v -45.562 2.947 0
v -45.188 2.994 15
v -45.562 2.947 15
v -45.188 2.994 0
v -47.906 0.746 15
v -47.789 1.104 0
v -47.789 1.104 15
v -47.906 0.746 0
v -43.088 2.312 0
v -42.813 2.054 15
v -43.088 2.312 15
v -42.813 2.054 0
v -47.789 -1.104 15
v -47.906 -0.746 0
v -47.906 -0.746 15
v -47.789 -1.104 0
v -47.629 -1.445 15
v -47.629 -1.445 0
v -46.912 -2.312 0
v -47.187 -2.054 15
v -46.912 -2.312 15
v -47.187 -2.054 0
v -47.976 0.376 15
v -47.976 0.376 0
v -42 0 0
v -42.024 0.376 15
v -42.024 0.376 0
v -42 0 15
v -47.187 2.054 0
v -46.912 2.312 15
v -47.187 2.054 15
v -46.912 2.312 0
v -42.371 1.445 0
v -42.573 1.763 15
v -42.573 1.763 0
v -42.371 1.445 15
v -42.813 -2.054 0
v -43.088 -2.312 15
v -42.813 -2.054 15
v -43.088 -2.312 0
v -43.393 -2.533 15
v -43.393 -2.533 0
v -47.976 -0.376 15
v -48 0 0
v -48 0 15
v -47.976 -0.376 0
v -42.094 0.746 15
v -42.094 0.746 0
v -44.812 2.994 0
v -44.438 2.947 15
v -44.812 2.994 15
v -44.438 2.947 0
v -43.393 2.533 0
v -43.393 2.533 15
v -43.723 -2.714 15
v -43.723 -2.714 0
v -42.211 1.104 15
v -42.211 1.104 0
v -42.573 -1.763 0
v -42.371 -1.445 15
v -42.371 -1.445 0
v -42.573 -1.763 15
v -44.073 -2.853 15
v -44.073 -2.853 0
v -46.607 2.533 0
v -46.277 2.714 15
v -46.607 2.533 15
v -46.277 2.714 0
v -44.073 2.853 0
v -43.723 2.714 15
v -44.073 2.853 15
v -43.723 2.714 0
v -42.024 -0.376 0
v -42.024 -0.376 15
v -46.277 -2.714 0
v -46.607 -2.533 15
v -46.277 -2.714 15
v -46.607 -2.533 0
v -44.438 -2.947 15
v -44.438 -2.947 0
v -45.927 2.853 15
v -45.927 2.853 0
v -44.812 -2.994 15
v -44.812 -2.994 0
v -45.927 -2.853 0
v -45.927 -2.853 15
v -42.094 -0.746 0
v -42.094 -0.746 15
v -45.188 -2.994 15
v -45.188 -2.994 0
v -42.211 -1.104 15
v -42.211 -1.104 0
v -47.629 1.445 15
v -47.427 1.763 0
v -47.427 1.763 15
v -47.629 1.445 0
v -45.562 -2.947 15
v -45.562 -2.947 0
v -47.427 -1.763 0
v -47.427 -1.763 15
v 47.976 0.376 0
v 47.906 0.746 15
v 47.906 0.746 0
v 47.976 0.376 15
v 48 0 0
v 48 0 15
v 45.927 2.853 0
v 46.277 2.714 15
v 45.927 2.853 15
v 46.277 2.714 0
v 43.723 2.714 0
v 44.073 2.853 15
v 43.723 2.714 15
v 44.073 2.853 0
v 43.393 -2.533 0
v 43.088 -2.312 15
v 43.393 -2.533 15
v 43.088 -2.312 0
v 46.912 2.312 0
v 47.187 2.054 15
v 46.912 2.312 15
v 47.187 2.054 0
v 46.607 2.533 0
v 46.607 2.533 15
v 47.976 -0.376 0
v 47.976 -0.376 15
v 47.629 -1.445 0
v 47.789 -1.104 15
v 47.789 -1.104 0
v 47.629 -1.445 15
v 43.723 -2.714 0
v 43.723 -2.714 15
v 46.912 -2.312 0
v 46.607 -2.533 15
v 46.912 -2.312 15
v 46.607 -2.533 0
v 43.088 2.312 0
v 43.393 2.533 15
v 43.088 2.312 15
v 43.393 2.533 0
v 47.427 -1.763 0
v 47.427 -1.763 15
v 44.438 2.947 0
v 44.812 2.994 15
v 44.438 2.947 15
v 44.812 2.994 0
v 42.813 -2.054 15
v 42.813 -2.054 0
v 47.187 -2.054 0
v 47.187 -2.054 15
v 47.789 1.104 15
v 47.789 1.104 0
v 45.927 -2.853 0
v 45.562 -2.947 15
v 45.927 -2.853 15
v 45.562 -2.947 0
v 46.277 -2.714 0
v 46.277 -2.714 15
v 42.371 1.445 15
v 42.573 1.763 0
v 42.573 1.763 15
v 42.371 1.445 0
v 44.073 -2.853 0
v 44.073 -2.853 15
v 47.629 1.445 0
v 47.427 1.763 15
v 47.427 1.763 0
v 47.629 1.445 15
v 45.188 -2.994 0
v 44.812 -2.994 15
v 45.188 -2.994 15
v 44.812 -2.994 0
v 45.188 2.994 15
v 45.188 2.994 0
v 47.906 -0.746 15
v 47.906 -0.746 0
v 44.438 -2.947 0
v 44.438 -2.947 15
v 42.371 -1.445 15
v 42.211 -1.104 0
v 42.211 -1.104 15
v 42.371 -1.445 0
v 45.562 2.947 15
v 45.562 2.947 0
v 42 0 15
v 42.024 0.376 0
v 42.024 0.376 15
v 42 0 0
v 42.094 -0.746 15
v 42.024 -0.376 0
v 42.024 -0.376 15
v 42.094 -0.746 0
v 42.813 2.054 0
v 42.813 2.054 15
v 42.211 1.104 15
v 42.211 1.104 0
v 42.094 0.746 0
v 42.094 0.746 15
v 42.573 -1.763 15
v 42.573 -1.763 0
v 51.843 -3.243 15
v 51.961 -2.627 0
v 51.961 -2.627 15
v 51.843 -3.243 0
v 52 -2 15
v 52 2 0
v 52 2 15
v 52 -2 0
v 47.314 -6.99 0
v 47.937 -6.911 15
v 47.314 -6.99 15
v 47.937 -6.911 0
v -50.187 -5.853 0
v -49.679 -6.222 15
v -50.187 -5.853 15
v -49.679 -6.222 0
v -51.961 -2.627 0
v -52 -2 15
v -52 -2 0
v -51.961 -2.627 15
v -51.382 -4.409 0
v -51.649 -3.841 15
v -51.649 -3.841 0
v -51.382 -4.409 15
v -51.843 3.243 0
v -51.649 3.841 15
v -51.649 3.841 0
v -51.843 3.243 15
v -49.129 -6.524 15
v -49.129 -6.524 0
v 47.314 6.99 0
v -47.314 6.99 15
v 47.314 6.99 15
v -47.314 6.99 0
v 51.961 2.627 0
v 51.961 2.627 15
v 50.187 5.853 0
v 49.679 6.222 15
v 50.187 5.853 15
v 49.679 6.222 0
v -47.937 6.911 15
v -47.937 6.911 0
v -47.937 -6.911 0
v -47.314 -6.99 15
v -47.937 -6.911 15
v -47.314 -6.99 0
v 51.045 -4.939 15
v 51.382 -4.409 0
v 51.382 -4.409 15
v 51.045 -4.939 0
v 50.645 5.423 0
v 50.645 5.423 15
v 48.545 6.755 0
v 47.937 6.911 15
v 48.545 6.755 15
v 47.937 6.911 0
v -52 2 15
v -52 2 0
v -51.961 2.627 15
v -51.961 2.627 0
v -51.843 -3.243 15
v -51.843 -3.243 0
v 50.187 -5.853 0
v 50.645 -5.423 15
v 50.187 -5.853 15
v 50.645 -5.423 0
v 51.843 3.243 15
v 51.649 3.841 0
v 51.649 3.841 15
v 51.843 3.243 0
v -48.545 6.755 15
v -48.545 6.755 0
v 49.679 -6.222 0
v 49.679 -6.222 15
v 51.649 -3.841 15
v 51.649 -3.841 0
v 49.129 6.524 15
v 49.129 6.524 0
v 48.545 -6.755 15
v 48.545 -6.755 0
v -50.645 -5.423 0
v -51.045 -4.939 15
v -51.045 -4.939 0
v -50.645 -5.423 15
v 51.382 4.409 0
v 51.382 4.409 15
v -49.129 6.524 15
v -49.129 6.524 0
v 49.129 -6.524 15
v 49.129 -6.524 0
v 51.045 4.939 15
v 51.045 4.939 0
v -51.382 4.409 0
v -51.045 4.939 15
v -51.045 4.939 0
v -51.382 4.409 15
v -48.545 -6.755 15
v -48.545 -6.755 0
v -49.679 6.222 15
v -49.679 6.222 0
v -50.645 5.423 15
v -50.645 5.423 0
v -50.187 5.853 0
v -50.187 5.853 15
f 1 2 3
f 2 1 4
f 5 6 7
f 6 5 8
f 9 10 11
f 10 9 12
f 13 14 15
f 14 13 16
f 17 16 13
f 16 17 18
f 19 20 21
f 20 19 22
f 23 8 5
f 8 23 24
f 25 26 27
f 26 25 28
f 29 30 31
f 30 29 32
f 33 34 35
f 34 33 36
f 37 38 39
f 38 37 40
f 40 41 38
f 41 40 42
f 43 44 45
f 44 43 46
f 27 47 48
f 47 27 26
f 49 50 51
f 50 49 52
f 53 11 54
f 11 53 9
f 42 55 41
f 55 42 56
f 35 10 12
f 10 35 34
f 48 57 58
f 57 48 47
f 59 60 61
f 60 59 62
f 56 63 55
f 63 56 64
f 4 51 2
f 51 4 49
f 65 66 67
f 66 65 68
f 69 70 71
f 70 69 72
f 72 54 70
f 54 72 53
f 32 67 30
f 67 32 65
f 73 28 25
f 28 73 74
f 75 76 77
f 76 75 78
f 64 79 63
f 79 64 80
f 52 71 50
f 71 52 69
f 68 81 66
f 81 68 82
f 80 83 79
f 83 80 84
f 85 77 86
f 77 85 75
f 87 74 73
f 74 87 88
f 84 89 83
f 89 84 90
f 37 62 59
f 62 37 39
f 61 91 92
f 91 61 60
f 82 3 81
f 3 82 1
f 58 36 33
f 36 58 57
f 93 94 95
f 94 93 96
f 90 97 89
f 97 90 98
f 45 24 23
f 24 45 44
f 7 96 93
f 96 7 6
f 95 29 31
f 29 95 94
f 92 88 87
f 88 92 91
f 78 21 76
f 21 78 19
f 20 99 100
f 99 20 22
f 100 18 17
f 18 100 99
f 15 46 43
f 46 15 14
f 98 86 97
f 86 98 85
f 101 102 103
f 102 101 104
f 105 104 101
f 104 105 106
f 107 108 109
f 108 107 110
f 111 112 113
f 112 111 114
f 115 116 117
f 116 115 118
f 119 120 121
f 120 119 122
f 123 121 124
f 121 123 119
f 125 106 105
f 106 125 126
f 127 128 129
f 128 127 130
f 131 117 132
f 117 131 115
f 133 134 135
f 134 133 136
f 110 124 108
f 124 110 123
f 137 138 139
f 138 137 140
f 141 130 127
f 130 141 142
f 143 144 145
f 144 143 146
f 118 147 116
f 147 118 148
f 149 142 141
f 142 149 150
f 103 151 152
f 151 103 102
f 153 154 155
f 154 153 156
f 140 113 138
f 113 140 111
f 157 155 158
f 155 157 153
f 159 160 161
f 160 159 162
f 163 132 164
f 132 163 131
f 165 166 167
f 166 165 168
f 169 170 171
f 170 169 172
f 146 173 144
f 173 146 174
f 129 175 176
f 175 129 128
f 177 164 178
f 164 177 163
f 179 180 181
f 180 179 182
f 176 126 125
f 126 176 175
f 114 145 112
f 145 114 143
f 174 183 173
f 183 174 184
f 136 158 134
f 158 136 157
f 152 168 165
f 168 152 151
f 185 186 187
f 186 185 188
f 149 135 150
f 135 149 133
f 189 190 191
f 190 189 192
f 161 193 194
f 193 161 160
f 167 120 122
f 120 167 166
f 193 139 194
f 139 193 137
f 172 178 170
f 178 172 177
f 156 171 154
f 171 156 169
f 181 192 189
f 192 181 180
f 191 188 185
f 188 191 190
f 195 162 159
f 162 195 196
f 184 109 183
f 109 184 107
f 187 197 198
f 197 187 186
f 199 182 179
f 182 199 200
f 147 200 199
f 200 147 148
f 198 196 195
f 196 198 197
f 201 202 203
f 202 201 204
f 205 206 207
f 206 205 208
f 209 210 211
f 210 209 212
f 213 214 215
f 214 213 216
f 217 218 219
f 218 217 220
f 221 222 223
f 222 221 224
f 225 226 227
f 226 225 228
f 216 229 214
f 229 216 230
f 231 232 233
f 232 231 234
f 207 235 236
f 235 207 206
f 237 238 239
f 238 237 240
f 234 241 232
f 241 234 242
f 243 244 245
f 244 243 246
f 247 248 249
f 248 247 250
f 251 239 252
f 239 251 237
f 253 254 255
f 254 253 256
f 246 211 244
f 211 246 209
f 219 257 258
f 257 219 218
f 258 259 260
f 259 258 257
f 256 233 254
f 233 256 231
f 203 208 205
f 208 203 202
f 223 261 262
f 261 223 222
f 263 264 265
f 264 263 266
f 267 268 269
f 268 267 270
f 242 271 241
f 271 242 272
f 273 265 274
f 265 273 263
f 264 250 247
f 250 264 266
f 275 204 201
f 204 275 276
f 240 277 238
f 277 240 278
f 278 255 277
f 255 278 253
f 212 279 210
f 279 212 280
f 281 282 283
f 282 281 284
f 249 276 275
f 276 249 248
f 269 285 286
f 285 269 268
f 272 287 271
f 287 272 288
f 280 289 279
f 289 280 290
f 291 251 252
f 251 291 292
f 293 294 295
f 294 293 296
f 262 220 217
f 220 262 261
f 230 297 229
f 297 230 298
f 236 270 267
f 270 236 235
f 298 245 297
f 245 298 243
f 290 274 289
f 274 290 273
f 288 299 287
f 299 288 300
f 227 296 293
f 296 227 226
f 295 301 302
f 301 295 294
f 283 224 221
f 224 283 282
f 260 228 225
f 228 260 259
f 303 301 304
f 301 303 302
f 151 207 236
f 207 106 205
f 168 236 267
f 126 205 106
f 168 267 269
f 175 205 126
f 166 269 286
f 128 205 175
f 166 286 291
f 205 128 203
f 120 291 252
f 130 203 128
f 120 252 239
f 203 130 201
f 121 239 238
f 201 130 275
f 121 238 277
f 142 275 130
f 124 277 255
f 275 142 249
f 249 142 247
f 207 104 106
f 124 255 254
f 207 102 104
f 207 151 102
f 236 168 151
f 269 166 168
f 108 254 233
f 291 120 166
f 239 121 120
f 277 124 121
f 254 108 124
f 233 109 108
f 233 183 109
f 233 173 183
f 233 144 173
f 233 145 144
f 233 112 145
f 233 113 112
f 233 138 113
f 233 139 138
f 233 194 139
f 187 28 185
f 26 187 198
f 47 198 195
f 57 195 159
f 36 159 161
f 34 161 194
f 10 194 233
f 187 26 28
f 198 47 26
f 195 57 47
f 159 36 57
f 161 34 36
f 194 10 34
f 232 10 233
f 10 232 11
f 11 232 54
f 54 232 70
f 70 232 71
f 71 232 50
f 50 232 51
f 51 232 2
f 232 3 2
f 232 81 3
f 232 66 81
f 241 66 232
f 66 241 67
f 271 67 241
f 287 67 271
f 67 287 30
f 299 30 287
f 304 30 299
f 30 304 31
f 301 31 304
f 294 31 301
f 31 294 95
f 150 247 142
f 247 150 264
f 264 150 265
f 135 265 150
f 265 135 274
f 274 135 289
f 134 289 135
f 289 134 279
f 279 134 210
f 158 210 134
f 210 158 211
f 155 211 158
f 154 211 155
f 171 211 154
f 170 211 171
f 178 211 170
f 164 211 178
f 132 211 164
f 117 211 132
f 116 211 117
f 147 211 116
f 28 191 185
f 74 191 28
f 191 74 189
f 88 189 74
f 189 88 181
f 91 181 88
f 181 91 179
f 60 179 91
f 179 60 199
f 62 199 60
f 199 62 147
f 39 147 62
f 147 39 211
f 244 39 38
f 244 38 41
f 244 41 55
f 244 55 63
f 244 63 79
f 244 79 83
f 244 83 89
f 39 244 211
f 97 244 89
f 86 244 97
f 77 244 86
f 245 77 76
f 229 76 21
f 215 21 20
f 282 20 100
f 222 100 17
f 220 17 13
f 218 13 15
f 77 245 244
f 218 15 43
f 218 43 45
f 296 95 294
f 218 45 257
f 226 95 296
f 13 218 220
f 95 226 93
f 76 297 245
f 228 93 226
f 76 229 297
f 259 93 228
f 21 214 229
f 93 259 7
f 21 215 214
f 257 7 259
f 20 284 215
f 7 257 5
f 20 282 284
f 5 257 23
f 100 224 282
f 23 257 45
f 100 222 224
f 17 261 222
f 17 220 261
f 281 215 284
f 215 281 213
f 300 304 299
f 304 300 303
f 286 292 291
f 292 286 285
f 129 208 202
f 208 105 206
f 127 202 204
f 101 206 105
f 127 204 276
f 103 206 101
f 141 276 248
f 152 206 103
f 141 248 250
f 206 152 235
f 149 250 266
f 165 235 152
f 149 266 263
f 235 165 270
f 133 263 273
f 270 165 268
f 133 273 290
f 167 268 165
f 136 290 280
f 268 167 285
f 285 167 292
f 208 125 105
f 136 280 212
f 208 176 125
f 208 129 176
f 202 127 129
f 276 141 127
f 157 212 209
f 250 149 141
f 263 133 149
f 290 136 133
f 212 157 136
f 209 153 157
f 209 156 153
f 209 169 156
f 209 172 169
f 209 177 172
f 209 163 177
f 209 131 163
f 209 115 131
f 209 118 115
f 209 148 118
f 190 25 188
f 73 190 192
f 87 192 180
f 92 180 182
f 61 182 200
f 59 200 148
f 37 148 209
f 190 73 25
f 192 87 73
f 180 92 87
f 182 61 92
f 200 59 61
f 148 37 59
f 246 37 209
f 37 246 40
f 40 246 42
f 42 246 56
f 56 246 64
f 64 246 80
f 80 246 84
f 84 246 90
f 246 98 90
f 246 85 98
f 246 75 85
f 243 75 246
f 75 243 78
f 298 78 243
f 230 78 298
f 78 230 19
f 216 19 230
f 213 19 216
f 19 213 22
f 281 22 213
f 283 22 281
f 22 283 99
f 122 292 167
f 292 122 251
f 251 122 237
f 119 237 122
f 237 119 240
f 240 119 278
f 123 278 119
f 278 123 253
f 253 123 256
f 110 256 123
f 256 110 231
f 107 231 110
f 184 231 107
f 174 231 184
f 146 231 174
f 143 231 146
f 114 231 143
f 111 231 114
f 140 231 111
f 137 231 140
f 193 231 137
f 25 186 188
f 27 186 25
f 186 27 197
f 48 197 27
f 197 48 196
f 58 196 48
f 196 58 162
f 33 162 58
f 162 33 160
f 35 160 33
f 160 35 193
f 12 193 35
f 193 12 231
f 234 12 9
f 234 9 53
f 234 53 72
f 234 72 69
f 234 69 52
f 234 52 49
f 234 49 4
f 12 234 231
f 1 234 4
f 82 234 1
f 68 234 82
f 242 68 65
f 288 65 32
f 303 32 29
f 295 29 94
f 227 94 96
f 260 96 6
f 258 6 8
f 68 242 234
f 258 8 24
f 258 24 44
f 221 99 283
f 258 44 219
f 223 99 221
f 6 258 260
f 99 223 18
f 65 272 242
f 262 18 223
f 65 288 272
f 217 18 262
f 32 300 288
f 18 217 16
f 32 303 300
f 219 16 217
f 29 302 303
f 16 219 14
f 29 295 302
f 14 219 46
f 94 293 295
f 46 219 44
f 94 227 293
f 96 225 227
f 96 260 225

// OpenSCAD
$fn = 50;


difference() {
	union() {
		hull() {
			translate(v = [-47.0000000000, 2.0000000000, 0]) {
				cylinder(h = 15, r = 5);
			}
			translate(v = [47.0000000000, 2.0000000000, 0]) {
				cylinder(h = 15, r = 5);
			}
			translate(v = [-47.0000000000, -2.0000000000, 0]) {
				cylinder(h = 15, r = 5);
			}
			translate(v = [47.0000000000, -2.0000000000, 0]) {
				cylinder(h = 15, r = 5);
			}
		}
	}
	union() {
		translate(v = [-45.0000000000, 0.0000000000, -100.0000000000]) {
			cylinder(h = 200, r = 3.0000000000);
		}
		translate(v = [-45.0000000000, 0.0000000000, -100.0000000000]) {
			cylinder(h = 200, r = 3.0000000000);
		}
		translate(v = [45.0000000000, 0.0000000000, -100.0000000000]) {
			cylinder(h = 200, r = 3.0000000000);
		}
		translate(v = [45.0000000000, 0.0000000000, -100.0000000000]) {
			cylinder(h = 200, r = 3.0000000000);
		}
	}
}
